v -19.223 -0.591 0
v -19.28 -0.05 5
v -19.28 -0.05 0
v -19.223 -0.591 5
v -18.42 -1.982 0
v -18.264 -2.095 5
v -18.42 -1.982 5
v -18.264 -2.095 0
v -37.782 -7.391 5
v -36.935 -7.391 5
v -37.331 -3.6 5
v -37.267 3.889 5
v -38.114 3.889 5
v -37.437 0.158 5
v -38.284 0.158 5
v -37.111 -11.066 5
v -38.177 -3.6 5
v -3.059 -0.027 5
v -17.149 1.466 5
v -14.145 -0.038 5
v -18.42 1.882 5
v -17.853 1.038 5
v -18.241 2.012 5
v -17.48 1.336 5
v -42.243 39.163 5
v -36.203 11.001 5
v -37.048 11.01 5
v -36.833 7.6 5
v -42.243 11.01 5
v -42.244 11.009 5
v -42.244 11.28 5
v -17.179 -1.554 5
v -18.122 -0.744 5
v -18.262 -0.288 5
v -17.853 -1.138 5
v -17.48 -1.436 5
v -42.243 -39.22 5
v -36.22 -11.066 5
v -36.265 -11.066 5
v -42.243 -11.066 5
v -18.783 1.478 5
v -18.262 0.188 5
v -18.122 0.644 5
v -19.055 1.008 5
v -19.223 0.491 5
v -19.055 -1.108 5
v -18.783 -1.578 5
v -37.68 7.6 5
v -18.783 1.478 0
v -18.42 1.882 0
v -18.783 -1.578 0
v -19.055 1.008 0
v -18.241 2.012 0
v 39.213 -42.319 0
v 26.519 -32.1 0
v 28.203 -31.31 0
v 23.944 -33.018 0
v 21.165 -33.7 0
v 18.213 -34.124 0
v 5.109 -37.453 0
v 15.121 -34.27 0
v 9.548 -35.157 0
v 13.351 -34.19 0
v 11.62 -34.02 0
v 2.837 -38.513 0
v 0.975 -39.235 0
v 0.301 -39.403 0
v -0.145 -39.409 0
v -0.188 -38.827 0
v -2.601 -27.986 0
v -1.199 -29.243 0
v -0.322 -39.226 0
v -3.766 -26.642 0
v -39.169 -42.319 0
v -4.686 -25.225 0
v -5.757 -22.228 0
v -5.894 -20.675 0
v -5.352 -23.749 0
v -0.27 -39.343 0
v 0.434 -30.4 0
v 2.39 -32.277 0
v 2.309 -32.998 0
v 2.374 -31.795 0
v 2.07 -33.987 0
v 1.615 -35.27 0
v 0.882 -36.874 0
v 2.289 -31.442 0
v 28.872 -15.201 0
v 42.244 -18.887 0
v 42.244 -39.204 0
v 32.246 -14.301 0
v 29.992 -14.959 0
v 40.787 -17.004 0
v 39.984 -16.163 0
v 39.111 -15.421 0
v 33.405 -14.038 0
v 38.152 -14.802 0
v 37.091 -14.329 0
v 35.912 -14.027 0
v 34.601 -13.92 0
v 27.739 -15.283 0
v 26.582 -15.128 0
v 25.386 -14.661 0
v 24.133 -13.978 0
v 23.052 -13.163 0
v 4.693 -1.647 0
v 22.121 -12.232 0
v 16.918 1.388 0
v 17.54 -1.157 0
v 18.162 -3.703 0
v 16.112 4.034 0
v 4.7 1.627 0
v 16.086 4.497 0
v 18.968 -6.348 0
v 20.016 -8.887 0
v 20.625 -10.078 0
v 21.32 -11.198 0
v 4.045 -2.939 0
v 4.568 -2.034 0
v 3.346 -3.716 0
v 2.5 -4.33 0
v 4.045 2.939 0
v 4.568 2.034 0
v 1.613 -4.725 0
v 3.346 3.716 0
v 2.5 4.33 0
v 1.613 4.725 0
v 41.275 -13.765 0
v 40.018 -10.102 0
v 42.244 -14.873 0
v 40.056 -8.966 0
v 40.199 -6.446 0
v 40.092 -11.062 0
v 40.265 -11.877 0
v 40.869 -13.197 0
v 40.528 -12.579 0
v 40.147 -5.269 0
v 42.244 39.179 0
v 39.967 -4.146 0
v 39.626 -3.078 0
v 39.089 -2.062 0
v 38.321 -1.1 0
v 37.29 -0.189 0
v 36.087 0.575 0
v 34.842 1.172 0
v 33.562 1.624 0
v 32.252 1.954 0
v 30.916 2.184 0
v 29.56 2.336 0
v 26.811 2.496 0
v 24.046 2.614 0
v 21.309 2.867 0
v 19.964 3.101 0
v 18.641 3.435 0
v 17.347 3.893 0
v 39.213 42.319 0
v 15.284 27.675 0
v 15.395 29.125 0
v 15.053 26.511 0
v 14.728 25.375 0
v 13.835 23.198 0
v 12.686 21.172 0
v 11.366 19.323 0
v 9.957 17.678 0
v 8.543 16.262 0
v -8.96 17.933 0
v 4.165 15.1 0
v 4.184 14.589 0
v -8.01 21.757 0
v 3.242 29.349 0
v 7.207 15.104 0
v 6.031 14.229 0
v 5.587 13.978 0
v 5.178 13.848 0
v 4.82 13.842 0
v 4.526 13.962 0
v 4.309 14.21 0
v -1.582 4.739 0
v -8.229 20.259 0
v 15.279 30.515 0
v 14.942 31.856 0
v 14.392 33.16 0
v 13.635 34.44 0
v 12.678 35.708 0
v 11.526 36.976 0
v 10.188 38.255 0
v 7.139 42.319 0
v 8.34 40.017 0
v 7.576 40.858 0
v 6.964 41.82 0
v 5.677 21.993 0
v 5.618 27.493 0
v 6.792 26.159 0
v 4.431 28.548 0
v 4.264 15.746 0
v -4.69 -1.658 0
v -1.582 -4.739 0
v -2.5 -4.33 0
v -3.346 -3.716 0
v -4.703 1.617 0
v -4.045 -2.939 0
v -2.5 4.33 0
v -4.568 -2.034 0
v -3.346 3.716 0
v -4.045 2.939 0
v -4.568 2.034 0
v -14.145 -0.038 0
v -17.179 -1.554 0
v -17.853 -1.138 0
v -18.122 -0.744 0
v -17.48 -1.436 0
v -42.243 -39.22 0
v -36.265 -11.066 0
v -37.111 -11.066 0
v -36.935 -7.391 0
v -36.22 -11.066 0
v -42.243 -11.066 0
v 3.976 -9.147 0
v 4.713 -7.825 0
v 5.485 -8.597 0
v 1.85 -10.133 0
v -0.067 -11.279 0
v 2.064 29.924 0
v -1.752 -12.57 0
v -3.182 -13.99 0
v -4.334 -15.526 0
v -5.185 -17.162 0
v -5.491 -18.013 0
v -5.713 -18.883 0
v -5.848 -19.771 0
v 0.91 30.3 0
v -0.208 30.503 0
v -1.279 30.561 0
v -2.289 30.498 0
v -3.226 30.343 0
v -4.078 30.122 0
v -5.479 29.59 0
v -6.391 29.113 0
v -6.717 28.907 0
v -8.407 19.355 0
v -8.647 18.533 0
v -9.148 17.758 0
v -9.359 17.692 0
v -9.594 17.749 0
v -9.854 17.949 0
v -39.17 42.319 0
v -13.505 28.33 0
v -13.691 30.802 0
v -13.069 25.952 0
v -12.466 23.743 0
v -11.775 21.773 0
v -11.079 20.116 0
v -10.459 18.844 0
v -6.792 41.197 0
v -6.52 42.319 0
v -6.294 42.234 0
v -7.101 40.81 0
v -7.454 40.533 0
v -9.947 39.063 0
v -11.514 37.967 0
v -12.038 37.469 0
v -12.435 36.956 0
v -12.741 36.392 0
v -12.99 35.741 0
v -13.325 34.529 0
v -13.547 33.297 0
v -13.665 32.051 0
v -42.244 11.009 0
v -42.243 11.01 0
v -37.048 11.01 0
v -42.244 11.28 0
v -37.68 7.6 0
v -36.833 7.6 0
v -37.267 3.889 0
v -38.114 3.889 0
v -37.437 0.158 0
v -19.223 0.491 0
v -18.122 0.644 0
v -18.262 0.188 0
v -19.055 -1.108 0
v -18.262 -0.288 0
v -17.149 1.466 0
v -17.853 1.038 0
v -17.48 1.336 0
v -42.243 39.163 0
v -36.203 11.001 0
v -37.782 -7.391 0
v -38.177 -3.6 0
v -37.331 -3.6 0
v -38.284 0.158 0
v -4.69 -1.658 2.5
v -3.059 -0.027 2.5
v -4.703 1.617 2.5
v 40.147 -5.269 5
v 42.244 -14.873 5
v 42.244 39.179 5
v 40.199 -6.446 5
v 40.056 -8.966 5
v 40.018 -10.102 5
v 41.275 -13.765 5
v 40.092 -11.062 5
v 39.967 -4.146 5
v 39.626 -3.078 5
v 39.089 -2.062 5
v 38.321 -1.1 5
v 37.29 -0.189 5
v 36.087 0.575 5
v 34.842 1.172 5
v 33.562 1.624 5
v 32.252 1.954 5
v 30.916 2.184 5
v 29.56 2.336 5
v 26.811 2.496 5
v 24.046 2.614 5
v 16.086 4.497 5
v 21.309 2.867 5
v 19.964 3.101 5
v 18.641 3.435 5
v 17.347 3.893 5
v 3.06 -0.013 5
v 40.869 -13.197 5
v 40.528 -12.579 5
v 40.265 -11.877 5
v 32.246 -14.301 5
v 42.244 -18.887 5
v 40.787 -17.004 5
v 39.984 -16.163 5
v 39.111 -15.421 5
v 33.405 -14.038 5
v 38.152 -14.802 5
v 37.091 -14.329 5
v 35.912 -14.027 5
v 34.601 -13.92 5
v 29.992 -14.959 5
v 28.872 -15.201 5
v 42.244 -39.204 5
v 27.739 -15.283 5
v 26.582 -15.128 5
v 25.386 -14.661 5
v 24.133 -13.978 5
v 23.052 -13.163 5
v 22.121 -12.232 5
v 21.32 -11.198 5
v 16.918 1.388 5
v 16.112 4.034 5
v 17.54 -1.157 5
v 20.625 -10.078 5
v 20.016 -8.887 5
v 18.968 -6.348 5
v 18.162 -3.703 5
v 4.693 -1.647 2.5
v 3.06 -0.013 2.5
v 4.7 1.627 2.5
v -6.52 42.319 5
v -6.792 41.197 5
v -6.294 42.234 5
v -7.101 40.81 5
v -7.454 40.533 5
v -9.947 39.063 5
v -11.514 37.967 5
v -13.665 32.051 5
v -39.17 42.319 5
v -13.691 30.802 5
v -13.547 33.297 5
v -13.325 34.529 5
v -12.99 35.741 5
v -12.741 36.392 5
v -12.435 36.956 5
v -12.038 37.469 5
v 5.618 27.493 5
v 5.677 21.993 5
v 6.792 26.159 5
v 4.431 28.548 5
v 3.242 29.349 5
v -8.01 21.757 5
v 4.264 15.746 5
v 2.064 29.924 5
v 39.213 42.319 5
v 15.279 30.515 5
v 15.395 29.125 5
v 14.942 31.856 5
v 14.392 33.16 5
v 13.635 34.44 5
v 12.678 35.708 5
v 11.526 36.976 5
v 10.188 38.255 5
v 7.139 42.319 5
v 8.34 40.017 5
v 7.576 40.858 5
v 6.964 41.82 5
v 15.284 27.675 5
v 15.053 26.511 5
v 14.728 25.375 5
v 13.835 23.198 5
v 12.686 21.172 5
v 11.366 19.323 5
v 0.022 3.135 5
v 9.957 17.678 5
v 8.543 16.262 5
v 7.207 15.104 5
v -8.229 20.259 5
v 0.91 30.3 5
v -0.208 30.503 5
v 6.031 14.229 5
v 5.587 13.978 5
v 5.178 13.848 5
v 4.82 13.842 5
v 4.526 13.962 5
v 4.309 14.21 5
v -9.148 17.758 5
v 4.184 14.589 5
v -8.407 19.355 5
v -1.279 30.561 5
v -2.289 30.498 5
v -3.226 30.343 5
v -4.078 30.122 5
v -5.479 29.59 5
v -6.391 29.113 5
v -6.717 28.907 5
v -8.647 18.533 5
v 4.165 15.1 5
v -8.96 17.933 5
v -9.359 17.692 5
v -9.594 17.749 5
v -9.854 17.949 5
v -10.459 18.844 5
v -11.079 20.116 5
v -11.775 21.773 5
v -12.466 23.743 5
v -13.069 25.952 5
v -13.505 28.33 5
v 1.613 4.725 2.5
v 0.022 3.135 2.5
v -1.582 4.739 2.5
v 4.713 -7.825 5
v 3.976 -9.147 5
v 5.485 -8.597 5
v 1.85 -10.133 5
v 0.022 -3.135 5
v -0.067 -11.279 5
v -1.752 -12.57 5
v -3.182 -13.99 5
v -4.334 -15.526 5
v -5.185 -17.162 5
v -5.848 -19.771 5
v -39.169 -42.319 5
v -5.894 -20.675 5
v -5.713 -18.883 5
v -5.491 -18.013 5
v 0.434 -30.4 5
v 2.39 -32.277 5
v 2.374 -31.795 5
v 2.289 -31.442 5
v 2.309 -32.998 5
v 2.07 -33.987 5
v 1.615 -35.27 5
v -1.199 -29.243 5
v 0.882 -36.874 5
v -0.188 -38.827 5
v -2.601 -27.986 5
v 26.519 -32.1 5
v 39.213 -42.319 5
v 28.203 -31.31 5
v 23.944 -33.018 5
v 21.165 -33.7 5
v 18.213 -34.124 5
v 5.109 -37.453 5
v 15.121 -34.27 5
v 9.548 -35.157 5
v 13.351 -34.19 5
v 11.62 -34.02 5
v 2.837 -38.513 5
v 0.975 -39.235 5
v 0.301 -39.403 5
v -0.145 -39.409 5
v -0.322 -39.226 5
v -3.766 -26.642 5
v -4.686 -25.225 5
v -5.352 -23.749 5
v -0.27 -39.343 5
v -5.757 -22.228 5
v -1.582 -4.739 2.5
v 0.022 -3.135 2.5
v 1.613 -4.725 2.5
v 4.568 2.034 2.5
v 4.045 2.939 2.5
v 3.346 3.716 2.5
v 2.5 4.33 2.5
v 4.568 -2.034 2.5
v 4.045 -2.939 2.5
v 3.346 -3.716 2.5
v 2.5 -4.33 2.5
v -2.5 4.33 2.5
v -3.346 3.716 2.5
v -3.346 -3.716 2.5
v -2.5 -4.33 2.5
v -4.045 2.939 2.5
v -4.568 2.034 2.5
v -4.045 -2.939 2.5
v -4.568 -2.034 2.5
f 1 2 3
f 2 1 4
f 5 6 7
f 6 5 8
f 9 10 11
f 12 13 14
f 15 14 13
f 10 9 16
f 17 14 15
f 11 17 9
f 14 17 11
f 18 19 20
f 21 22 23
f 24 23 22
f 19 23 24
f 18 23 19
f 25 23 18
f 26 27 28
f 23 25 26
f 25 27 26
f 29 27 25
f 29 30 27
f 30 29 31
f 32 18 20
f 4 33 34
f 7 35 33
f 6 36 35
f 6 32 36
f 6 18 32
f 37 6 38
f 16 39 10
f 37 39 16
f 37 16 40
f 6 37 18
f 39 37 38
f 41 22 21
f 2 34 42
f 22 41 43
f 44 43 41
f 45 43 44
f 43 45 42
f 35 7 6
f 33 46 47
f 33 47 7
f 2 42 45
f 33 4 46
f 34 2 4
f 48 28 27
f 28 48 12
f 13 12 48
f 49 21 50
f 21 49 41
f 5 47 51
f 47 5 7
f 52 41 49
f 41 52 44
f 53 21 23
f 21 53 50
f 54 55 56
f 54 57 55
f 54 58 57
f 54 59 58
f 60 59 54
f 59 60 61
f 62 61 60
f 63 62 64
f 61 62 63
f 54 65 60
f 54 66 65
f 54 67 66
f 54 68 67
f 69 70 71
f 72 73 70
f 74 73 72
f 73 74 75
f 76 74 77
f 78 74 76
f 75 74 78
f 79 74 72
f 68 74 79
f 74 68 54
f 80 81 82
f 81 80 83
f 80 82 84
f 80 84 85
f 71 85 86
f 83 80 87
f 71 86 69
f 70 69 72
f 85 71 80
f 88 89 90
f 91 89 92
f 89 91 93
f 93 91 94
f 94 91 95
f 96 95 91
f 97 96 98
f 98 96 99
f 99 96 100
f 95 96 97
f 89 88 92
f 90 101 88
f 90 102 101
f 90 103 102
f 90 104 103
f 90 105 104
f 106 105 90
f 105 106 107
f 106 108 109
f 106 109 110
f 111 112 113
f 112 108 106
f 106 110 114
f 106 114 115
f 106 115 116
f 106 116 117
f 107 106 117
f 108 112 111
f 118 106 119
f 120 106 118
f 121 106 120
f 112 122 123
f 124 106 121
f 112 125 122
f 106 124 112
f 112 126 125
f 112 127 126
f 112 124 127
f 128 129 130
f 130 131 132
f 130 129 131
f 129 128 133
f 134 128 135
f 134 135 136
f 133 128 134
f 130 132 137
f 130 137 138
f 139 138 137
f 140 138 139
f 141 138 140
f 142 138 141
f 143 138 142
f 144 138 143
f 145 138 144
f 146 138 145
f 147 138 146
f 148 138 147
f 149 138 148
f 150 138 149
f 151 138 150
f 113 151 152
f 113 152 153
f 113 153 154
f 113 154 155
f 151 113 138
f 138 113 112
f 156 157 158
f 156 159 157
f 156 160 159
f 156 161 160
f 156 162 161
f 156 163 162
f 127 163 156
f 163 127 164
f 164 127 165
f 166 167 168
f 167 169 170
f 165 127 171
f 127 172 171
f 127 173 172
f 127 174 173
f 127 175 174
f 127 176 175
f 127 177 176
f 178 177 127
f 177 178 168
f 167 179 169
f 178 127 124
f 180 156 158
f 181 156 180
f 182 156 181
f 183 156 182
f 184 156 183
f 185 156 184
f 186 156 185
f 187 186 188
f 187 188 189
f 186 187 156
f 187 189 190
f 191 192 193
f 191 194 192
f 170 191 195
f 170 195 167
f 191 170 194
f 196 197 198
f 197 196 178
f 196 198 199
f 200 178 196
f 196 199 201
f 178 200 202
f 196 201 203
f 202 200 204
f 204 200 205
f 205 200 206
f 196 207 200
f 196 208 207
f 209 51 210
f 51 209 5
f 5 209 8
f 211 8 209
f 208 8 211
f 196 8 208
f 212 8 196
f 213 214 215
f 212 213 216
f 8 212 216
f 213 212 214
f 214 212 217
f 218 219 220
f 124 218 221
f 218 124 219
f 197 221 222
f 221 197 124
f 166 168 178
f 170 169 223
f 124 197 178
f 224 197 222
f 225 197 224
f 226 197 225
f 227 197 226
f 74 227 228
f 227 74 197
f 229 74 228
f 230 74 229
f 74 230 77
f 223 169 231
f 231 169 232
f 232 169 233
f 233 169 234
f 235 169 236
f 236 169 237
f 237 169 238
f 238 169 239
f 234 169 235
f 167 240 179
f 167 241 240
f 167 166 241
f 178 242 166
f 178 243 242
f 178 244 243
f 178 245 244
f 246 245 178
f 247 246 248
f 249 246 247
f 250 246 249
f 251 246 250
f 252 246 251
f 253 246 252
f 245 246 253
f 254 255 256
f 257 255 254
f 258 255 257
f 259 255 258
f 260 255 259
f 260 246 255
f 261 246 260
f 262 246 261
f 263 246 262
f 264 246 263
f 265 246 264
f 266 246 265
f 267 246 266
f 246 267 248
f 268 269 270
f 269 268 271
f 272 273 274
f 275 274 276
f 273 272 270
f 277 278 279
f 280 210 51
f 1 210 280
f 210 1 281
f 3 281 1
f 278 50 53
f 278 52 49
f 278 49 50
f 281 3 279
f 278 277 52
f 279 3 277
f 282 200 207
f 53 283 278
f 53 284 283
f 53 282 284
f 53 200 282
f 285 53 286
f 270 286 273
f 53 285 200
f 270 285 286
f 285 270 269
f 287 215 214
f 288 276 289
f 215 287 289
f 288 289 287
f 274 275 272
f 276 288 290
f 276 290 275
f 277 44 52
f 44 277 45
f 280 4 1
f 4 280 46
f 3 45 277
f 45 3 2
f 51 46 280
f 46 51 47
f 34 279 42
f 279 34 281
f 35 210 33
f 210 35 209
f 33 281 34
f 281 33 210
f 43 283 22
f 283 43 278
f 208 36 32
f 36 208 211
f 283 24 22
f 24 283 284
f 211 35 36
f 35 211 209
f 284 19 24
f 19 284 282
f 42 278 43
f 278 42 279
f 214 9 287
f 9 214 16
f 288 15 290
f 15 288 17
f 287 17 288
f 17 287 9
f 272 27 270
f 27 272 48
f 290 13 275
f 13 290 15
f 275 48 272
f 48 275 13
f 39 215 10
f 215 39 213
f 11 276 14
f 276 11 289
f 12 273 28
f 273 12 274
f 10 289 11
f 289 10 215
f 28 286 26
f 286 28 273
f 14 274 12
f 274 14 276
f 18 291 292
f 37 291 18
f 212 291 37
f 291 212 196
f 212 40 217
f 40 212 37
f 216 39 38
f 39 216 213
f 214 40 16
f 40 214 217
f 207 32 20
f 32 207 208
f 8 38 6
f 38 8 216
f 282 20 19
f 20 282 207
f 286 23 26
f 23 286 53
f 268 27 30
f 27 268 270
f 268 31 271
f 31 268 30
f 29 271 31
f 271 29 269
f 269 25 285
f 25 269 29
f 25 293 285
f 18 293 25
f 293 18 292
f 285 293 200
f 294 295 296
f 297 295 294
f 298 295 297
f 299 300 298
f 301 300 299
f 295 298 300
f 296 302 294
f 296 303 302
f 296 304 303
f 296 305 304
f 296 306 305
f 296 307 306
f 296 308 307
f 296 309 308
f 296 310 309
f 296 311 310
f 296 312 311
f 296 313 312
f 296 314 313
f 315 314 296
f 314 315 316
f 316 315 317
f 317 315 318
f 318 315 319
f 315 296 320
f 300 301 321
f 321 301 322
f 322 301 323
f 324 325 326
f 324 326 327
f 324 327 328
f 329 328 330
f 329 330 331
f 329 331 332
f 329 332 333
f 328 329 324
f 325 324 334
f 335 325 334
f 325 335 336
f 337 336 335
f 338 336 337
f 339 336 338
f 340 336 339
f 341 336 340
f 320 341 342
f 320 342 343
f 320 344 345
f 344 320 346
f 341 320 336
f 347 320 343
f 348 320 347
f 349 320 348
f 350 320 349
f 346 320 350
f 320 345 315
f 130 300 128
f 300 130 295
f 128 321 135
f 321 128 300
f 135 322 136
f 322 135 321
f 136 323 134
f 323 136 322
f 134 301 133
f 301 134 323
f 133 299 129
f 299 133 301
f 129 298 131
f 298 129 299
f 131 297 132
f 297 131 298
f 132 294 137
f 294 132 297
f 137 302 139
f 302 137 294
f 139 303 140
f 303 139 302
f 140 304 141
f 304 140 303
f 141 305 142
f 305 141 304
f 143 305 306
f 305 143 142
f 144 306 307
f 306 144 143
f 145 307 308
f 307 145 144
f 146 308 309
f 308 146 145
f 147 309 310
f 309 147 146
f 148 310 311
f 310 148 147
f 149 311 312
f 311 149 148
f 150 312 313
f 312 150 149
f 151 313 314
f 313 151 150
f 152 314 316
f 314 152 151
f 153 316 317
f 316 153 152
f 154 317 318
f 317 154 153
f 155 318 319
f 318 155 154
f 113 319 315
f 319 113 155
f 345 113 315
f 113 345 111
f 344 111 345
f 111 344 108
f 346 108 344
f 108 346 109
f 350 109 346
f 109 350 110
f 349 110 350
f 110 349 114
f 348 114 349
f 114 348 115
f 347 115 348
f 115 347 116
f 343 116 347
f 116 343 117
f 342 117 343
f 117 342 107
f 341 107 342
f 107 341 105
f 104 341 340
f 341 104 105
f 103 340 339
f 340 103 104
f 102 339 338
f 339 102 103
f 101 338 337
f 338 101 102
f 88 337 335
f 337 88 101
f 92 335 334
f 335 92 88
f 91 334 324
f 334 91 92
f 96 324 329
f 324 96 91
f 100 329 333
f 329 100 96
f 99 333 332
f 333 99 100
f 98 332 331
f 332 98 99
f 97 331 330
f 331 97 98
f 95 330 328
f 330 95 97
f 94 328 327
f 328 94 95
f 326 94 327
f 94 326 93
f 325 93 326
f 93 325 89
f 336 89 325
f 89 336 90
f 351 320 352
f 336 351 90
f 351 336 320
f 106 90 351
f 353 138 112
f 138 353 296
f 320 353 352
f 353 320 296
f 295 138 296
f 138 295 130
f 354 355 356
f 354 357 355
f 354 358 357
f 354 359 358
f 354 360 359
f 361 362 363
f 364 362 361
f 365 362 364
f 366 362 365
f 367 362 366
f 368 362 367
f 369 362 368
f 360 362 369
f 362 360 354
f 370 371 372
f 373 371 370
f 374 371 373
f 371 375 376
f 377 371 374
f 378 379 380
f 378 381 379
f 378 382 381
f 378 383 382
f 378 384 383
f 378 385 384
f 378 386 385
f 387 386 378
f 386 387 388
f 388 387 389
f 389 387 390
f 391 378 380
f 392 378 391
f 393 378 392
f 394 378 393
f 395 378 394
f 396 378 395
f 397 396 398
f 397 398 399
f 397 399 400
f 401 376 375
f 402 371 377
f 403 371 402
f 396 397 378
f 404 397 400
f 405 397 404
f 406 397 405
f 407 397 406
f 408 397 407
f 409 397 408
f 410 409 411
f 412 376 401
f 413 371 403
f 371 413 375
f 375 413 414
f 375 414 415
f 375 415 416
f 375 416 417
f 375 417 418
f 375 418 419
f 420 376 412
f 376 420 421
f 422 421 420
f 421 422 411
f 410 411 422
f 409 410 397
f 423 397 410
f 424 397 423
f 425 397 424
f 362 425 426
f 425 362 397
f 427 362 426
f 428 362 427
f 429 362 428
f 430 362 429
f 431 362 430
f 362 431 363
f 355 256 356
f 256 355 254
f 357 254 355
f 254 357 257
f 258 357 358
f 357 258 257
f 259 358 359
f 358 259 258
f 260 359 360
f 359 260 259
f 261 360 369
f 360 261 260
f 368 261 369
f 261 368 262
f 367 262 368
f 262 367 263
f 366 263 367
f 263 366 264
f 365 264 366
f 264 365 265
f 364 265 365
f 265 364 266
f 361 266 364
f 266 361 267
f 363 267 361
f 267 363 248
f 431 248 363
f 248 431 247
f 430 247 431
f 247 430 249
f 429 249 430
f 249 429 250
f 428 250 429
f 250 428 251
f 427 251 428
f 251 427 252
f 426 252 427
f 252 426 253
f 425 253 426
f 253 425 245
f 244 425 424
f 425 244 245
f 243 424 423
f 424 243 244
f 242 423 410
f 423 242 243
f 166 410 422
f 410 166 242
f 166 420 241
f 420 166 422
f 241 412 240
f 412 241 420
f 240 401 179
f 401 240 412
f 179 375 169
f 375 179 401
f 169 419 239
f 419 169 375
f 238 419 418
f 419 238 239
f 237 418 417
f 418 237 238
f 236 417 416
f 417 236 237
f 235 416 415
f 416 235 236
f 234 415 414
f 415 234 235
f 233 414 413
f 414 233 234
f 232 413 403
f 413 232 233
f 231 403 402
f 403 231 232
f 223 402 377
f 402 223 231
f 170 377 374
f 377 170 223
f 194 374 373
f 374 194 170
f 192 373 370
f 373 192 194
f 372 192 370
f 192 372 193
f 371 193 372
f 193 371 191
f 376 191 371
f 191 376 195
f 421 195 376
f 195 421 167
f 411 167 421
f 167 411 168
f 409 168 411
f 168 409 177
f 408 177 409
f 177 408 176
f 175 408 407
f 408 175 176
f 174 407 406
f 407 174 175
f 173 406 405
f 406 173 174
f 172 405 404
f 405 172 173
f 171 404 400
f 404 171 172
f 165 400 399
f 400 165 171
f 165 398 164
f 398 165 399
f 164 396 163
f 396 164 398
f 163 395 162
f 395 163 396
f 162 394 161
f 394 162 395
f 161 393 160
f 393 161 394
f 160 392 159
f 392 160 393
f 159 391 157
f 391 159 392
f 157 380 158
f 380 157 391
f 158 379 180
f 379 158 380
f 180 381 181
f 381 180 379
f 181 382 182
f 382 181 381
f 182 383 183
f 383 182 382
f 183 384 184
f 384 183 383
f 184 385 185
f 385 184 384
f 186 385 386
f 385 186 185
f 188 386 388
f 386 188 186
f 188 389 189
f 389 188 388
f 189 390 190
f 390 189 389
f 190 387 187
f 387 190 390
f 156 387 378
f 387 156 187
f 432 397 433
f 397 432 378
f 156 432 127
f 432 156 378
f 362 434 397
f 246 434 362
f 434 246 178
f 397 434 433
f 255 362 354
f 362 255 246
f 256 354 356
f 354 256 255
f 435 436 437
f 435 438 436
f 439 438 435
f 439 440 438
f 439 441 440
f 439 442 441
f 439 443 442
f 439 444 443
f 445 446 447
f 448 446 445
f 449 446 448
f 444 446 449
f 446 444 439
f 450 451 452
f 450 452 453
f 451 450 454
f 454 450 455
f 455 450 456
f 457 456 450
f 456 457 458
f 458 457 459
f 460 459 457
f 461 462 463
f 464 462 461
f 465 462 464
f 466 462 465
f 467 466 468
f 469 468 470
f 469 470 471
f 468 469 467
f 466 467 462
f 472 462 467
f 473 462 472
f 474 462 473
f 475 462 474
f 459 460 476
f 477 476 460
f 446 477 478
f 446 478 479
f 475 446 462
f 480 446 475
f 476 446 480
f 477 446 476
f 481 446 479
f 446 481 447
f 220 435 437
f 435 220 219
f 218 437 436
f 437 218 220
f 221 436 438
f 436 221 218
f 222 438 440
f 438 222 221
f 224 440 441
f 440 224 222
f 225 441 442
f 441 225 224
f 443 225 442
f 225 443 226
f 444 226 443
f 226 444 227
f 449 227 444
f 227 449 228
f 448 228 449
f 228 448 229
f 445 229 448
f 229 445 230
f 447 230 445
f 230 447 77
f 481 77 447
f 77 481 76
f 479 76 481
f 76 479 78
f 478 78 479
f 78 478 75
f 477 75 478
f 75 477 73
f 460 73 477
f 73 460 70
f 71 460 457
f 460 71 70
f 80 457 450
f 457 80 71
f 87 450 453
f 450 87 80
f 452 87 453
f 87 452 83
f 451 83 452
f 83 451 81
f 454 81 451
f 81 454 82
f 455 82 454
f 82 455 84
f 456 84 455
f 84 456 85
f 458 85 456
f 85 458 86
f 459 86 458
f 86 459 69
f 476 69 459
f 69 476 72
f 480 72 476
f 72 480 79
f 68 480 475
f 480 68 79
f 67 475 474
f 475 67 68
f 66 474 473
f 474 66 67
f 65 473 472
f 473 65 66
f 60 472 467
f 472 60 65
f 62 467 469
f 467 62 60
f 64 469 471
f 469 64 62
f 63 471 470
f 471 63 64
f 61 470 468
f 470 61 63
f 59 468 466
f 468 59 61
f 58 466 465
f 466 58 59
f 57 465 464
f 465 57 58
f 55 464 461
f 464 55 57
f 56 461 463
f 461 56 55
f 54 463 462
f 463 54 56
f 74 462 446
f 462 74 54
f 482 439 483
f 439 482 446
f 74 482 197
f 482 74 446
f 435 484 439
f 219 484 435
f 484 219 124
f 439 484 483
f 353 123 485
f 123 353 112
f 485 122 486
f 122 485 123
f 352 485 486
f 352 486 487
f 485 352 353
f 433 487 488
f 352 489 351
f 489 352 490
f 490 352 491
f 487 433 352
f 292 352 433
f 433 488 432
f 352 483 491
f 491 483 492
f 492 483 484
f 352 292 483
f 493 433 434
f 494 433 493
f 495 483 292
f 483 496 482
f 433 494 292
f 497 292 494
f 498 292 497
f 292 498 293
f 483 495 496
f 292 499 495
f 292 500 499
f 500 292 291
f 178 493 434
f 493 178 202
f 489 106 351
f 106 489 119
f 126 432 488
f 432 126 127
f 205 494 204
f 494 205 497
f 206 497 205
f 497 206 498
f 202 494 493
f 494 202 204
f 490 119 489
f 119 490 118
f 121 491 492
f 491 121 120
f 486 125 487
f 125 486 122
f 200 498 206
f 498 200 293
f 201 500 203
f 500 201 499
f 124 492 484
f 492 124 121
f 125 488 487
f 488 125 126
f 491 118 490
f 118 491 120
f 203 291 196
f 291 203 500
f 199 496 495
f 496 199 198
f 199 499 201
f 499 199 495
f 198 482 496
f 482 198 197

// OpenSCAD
// Module names are of the form poly_<inkscape-path-id>().  As a result,
// you can associate a polygon in this OpenSCAD program with the corresponding
// SVG element in the Inkscape document by looking for the XML element with
// the attribute id="inkscape-path-id".

// fudge value is used to ensure that subtracted solids are a tad taller
// in the z dimension than the polygon being subtracted from.  This helps
// keep the resulting .stl file manifold.
fudge = 0.1;
height = 5;

module poly_sustainability(h)
{
  scale([25.4/90, -25.4/90, 1]) union()
  {
    linear_extrude(height=h)
      polygon([[119.059500,49.321938],[114.820081,49.739379],[110.714930,50.672563],[102.729188,53.003813],[98.759476,53.860707],[94.745789,54.151000],[90.643567,53.604105],[86.408250,51.949438],[81.966543,49.529252],[78.135691,46.642016],[74.838658,43.340990],[71.998406,39.679438],[69.537901,35.710619],[67.380105,31.487797],[63.664500,22.493188],[60.810105,13.119672],[58.605281,4.101000],[56.400691,-4.918141],[53.547000,-14.293062],[53.454500,-15.934312],[57.922292,-13.795368],[62.508553,-12.172638],[67.194408,-10.986966],[71.960984,-10.159195],[81.660799,-9.260733],[91.457000,-8.844000],[101.198592,-8.275743],[106.001723,-7.736902],[110.734578,-6.922711],[115.378283,-5.754013],[119.913963,-4.151651],[124.322743,-2.036470],[128.585750,0.670688],[132.240567,3.896293],[134.959598,7.307172],[136.863619,10.905199],[138.073406,14.692250],[138.709737,18.670199],[138.893387,22.840922],[138.385750,31.768188],[138.252571,35.795016],[138.513758,39.196957],[139.129612,42.084943],[140.060437,44.569906],[141.266536,46.762780],[142.708211,48.774496],[146.139500,52.698188],[146.139500,-138.824312],[7.299500,0.045688],[146.139500,138.911938],[146.139500,66.921938],[140.978191,60.251137],[138.133609,57.271657],[135.039344,54.642406],[131.640098,52.448097],[127.880574,50.773441],[123.705474,49.703151]]);
  }
}

module poly_make(h)
{
  scale([25.4/90, -25.4/90, 1]) union()
  {
    linear_extrude(height=h)
      polygon([[25.294875,-146.406813],[138.944875,-146.406813],[0.078625,-7.564312],[-138.790125,-146.406813],[-23.101375,-146.406813],[-22.301375,-146.104312],[-24.065906,-142.430094],[-25.161512,-141.058512],[-26.412625,-140.076813],[-35.245926,-134.869059],[-40.798094,-130.985406],[-42.653897,-129.220306],[-44.061590,-127.402457],[-45.145230,-125.403934],[-46.028875,-123.096813],[-47.214939,-118.805053],[-48.000101,-114.436529],[-48.420362,-110.023401],[-48.511727,-105.597828],[-47.851771,-96.837994],[-46.308250,-88.414313],[-44.169183,-80.584068],[-41.722586,-73.604547],[-39.256478,-67.733033],[-37.058875,-63.226813],[-34.916651,-60.055699],[-33.993017,-59.347848],[-33.160691,-59.143141],[-32.414419,-59.380084],[-31.748941,-59.997184],[-30.639344,-62.125875],[-29.789844,-65.037262],[-29.158387,-68.239391],[-28.381375,-73.548063],[-23.801375,-98.883062],[-22.646038,-99.613863],[-19.412820,-101.301734],[-14.450911,-103.189879],[-11.430819,-103.972555],[-8.109500,-104.521500],[-4.530603,-104.742115],[-0.737776,-104.539801],[3.225331,-103.819957],[7.315070,-102.487984],[11.487793,-100.449283],[15.699851,-97.609254],[19.907594,-93.873297],[24.067375,-89.146813],[20.115500,-74.382906],[15.109875,-52.249313],[14.757270,-49.960501],[14.826613,-48.149449],[15.269111,-46.808290],[16.035969,-45.929156],[17.078393,-45.504183],[18.347590,-45.525504],[19.794765,-45.985252],[21.371125,-46.875563],[25.535231,-49.975470],[30.270070,-54.079586],[35.280827,-59.093722],[40.272687,-64.923688],[44.950837,-71.475294],[49.020461,-78.654352],[52.186745,-86.366671],[53.339005,-90.393370],[54.154875,-94.518062],[54.548017,-99.656607],[54.137121,-104.580172],[52.945610,-109.331588],[50.996906,-113.953688],[48.314433,-118.489303],[44.921613,-122.981266],[40.841870,-127.472408],[36.098625,-132.005563],[29.552375,-138.249469],[26.843039,-141.229684],[24.674875,-144.636812],[25.294875,-146.406813]]);
  }
}

module poly_creatitvity(h)
{
  union() {
    scale([25.4/90, -25.4/90, 1])
    {
      linear_extrude(height=h)
        polygon([[-146.139500,-39.966937],[-146.139500,-39.009437],[-124.800750,-39.011937],[-46.575750,0.133063],[-124.795750,39.211813],[-143.664500,39.211813],[-146.138250,39.211813],[-146.138250,138.968063],[-7.297000,0.096813],[-146.138250,-138.768187],[-146.138250,-39.011937]]);
    }

    difference() {
      translate([-15.68, -0.05, 0])
      cylinder(h=h, r=2.6, $fs=0.5);

      translate([-15.68, -0.05, -h/2])
      scale([1,1,2])
      cylinder(h=h, r=1.6, $fs=0.5);

      translate([-13.68, -0.05, -h/2])
      scale([1,1,2])
      cylinder(h=h, r=1.6, $fs=0.5);
    }
    poly_border(h);
  }
}

module poly_border(h)
{
  translate([0.3, 0, 0])
  scale([25.4/90, -25.4/90, 1])
  {
    difference() {
      scale([1, 1.2, 1])
      bow(h);

      translate([ 3, 0, -h/2])
      scale([1,1.2,2])
      bow(h);
    }
  }
}

module bow(h) {
  linear_extrude(height=h)
    polygon([[-125.332625,-44.244312],[-128.603252,-33.355375],[-131.030145,-22.440934],[-132.567847,-11.483456],[-133.170906,-0.465406],[-132.793868,10.630749],[-131.391277,21.822543],[-128.917681,33.127511],[-125.327625,44.563188]]);
}

module poly_tip(h)
{
  scale([25.4/90, -25.4/90, 1]) union()
  {
    linear_extrude(height=h)
      polygon([[-46.478250,0.159938],[-46.663282,1.994305],[-47.193973,3.703238],[-48.033716,5.250013],[-49.145906,6.597906],[-50.493936,7.710194],[-52.041199,8.550152],[-53.751089,9.081058],[-55.587000,9.266188],[-57.422444,9.081058],[-59.131883,8.550152],[-60.678724,7.710194],[-62.026375,6.597906],[-63.138245,5.250013],[-63.977742,3.703238],[-64.508274,1.994305],[-64.693250,0.159938],[-64.508274,-1.676081],[-63.977742,-3.386254],[-63.138245,-4.933917],[-62.026375,-6.282406],[-60.678724,-7.395055],[-59.131883,-8.235199],[-57.422444,-8.766173],[-55.587000,-8.951313],[-53.751089,-8.766173],[-52.041199,-8.235199],[-50.493936,-7.395055],[-49.145906,-6.282406],[-48.033716,-4.933917],[-47.193973,-3.386254],[-46.663282,-1.676081],[-46.478250,0.159938]]);
  }
}

module poly_social(h)
{
  scale([25.4/90, -25.4/90, 1]) union()
  {
    linear_extrude(height=h)
      polygon([[99.931125,107.398063],[93.964875,110.195563],[84.841145,113.449215],[74.992844,115.865094],[64.533996,117.369020],[53.578625,117.886813],[47.306281,117.601188],[41.173625,117.000563],[33.830168,121.030191],[18.104406,129.165719],[10.053447,132.920057],[3.453254,135.477105],[1.066606,136.075004],[-0.514058,136.095609],[-0.955969,135.860471],[-1.140973,135.446264],[-0.666375,134.034313],[3.124208,127.112831],[5.720871,121.427457],[7.335825,116.881644],[8.181281,113.378844],[8.469453,110.822508],[8.412551,109.116090],[8.112375,107.866813],[1.538410,104.172823],[-4.247234,100.074039],[-9.217371,95.619298],[-13.344812,90.857438],[-16.602371,85.837296],[-18.962859,80.607711],[-20.399090,75.217521],[-20.883875,69.715563],[-20.722091,66.512633],[-20.243042,63.365719],[-19.456886,60.281383],[-18.373777,57.266188],[-15.357334,51.469469],[-11.274969,46.028063],[-6.207935,40.994469],[-0.237488,36.421188],[6.555117,32.360719],[14.088625,28.865563],[19.436125,26.919313],[16.698625,24.183063],[0.078625,7.564313],[-138.788875,146.406813],[138.944875,146.406813],[99.931125,107.398063]]);
  }
}

union() {
  translate([1, 0, 0])
  poly_sustainability(height);

  translate([0, 1, 0])
  poly_make(height);

  translate([-1, 0, 0])
  poly_creatitvity(height);

  translate([0, -1, 0])
  poly_social(height);

  cylinder(h=height/2, r=5, $fs=1);
}
